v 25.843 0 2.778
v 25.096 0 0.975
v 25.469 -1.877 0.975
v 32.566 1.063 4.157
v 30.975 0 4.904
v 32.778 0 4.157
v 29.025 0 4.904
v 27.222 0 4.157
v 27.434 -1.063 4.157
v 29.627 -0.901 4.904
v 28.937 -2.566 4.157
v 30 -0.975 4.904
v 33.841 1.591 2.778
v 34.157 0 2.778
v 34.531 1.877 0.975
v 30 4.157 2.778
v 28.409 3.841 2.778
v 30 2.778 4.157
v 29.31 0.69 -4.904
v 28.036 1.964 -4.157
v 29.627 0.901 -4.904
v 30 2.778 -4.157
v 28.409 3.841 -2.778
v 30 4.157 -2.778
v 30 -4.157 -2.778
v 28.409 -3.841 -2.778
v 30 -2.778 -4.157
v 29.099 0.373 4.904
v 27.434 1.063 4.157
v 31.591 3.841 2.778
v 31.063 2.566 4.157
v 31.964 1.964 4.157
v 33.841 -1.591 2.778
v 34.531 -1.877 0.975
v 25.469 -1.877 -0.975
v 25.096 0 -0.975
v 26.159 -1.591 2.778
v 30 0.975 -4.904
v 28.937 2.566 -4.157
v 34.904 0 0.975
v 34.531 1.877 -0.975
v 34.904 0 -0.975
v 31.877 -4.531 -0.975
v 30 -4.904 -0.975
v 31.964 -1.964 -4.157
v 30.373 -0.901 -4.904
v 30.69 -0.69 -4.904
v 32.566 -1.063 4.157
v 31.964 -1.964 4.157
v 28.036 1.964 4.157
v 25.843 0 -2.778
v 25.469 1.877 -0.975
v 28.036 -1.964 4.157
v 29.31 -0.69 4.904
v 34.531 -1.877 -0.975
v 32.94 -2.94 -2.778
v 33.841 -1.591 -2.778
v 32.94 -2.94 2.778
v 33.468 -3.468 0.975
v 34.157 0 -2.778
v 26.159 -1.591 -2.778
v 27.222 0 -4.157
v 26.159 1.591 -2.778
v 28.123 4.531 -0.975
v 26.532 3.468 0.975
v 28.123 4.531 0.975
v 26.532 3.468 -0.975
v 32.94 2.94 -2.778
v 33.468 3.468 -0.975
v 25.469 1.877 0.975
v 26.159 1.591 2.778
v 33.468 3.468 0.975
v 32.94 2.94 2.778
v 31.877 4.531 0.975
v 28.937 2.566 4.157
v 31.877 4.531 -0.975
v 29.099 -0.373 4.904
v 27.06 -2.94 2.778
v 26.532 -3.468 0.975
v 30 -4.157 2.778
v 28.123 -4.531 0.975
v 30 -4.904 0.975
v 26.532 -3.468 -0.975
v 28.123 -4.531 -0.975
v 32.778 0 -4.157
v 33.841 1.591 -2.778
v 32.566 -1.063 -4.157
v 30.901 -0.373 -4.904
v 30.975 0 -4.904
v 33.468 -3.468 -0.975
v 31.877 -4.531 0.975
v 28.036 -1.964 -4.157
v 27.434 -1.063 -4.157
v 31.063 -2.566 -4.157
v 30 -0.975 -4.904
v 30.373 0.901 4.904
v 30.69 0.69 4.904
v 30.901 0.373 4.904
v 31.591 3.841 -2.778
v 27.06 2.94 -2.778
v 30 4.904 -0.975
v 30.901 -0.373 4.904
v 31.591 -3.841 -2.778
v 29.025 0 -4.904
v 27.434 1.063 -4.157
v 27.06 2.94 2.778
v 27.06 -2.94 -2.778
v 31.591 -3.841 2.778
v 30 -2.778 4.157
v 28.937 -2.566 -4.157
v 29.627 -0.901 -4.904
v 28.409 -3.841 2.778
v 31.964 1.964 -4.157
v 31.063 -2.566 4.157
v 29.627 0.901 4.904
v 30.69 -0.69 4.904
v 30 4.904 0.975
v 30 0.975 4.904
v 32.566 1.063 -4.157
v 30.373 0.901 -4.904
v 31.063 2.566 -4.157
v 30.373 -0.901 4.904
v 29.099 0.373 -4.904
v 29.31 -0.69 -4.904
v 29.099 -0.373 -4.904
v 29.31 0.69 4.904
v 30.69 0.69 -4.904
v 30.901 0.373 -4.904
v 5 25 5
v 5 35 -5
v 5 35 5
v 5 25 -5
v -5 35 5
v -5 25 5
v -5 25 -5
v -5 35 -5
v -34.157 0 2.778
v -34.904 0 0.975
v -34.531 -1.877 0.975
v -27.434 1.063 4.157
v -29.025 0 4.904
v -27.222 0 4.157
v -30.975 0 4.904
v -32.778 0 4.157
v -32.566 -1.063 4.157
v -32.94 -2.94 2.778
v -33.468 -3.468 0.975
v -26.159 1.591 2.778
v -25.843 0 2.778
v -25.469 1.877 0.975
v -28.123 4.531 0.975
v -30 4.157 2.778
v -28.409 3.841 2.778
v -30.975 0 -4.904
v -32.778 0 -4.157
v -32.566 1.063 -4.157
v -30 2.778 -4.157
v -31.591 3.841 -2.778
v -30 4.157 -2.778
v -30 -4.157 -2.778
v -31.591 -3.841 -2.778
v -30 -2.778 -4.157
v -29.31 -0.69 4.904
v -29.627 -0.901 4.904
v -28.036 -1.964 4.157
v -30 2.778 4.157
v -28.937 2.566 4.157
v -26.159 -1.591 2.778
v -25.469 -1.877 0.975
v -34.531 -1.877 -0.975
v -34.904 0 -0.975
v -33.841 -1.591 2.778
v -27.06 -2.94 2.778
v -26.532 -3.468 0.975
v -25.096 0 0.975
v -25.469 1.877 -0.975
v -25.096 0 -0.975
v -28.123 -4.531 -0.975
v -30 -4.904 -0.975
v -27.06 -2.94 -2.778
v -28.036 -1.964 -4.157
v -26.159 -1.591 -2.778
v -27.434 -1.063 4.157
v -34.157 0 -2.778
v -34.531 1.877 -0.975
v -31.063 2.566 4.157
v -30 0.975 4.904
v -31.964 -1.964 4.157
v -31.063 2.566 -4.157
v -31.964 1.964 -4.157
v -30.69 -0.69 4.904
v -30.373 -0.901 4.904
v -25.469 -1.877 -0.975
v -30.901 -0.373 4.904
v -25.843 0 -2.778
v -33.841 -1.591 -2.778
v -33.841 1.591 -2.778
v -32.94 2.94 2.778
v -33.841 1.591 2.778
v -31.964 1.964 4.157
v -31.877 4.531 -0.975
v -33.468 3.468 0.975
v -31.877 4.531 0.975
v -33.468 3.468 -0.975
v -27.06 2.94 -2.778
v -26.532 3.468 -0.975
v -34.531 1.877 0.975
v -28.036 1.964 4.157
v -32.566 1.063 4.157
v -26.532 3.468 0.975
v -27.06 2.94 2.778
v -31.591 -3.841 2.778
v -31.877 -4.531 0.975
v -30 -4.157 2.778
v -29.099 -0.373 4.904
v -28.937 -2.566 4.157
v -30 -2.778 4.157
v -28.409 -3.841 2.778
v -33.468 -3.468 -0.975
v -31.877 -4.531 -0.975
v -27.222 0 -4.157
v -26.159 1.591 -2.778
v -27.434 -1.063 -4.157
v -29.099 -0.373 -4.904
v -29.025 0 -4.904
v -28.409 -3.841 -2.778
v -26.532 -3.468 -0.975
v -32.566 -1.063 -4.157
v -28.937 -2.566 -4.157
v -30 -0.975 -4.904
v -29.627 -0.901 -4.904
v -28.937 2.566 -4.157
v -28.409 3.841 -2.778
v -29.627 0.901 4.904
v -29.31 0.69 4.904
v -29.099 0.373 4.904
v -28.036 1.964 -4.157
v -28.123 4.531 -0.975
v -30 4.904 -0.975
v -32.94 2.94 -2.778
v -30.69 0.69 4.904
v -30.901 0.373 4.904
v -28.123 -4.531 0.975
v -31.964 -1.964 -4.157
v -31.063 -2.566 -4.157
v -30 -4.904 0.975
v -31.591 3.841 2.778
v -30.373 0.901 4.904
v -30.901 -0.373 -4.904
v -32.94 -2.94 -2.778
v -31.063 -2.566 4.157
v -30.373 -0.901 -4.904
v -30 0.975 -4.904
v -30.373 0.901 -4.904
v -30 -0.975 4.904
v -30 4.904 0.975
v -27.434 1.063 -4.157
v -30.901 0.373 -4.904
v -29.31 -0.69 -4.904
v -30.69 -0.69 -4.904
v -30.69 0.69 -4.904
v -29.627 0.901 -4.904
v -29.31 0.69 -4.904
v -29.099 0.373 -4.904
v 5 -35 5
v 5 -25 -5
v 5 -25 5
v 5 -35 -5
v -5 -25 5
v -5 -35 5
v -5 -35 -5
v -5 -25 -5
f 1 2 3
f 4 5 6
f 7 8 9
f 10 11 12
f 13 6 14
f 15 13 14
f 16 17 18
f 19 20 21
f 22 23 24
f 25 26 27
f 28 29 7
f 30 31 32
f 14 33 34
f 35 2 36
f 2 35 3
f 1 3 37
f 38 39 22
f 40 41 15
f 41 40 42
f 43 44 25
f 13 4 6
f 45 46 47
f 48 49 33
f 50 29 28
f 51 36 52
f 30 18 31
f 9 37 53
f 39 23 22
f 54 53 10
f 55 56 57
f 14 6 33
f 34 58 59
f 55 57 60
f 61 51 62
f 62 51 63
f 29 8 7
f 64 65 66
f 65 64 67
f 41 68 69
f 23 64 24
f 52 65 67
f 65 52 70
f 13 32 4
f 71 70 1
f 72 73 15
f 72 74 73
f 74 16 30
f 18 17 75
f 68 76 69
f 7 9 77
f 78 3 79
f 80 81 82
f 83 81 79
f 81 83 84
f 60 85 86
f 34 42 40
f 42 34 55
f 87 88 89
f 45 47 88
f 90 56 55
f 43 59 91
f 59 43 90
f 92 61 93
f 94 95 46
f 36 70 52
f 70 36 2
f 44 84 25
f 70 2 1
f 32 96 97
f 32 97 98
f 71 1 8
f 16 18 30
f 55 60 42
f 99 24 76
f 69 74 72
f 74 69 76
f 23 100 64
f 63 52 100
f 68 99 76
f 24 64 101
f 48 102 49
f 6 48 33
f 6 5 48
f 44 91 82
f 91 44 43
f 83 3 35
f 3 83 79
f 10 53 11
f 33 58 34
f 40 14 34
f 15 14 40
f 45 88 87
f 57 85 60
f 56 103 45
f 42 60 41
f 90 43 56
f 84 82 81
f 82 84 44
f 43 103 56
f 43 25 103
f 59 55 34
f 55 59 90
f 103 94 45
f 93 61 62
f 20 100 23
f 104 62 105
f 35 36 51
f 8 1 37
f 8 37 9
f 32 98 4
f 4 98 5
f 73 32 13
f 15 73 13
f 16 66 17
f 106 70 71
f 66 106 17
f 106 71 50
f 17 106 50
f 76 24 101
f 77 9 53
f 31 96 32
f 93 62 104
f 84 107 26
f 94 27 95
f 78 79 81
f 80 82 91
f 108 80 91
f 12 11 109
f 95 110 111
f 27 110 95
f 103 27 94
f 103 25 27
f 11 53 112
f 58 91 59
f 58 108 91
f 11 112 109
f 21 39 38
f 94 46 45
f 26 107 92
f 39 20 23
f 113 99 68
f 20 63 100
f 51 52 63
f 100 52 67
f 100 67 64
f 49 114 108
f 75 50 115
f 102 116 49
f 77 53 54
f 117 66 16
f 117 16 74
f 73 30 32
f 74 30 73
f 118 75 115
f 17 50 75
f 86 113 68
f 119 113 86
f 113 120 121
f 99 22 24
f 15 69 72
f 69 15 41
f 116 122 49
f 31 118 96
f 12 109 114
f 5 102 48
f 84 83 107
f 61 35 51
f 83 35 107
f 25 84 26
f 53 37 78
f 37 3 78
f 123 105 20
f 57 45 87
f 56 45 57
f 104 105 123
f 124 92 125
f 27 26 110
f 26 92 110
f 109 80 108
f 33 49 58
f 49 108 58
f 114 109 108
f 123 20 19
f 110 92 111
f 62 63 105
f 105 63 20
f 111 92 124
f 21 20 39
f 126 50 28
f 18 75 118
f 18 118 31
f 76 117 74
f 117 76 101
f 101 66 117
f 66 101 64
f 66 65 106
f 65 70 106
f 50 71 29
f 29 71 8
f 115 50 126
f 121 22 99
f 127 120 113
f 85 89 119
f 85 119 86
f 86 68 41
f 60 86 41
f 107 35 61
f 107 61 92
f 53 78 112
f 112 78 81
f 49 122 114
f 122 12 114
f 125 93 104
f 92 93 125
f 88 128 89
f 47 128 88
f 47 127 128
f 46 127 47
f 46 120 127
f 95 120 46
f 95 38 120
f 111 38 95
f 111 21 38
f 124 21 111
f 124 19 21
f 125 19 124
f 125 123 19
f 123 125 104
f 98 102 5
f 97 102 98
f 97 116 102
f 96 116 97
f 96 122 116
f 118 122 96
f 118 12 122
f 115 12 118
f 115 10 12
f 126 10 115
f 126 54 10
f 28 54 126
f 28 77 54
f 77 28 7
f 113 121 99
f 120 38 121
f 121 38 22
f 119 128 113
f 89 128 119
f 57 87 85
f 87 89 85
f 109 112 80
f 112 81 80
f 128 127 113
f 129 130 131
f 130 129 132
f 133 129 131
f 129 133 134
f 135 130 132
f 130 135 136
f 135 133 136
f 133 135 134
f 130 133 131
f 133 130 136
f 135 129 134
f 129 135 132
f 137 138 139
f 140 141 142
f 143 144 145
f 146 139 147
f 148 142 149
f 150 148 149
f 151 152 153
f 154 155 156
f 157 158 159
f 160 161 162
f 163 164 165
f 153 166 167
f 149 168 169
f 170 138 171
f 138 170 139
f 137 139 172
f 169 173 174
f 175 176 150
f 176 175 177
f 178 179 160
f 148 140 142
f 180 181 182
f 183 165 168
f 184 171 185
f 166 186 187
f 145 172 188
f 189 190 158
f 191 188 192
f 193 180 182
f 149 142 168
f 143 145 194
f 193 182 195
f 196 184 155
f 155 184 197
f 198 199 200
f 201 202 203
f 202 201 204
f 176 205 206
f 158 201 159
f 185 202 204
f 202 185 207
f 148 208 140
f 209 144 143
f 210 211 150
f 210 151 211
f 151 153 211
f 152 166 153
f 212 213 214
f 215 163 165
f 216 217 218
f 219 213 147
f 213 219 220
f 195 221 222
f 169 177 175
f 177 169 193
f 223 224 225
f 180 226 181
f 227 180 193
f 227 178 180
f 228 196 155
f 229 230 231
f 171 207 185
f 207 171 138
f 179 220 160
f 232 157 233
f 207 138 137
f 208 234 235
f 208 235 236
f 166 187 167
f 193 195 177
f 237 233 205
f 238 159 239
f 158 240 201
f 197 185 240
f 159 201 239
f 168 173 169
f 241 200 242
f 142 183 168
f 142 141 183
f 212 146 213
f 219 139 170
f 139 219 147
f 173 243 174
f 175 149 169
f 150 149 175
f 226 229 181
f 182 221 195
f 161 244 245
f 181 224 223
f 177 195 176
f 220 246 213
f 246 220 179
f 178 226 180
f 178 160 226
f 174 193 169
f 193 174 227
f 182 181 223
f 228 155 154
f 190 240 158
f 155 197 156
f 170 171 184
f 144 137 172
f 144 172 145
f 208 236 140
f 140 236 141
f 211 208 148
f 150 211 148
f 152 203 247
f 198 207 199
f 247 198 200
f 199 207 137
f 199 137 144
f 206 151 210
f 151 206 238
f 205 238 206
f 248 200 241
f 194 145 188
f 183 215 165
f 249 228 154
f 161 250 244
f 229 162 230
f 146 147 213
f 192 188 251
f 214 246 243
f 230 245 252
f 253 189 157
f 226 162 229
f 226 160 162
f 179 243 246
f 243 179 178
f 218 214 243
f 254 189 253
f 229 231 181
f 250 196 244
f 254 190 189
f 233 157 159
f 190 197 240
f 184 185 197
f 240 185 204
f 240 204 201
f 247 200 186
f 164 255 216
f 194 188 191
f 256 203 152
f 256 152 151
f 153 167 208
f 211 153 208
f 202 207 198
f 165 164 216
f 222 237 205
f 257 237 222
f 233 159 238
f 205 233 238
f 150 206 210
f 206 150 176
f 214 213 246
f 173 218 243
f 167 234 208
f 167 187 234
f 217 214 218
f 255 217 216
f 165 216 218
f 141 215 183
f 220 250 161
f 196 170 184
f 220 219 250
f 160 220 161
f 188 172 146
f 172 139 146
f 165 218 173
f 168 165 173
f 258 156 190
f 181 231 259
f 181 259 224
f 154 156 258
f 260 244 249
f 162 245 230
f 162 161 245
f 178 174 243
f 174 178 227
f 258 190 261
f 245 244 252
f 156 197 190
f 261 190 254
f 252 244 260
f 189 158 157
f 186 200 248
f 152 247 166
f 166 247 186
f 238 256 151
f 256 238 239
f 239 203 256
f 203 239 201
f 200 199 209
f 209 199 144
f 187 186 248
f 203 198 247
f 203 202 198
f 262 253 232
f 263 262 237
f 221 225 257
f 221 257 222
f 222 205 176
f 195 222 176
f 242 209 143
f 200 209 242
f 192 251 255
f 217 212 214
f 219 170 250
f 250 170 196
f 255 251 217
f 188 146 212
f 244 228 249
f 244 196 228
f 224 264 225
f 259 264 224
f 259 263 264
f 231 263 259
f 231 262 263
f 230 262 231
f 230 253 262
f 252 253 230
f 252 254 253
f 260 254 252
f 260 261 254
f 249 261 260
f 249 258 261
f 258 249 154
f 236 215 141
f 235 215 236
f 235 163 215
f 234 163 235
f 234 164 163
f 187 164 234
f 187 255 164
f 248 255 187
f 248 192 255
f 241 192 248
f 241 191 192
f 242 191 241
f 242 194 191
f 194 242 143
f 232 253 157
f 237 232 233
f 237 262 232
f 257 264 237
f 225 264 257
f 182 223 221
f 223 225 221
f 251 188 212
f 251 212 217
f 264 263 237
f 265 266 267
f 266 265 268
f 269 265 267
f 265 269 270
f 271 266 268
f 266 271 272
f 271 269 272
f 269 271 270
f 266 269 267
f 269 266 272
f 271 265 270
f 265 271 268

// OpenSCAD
// An interpreter module that can be extended
// to understand more SShapes (arrays representing shapes)
// by delegating to children(), passing the
// mystery SShape using the dynamic variable, $mod.

module mcext0_domodule(mod) {
	assert(is_list(mod));
	assert(len(mod) > 0);
	if( mod[0] == "polygon-vp" ) {
		// ["polygon-vp", vertexes, paths]
		polygon(points=mod[1], paths=mod[2]);
	} else if( mod[0] == "polyhedron-vf" ) {
		polyhedron(mod[1], faces=mod[2]);
	} else if( mod[0] == "scale" ) {
		assert(len(mod) == 3);
		scale(mod[1]) mcext0_domodule(mod[2]) children();
	} else if( mod[0] == "translate" ) {
		assert(len(mod) == 3);
		assert(is_list(mod[1]));
		for(c=mod[1]) assert(is_num(c), "translate component should be numeric");
		translate(mod[1]) mcext0_domodule(mod[2]) children();
	} else if( mod[0] == "rotate" ) {
		assert(len(mod) == 3);
		rotate(mod[1]) mcext0_domodule(mod[2]) children();
	} else if( mod[0] == "intersection" ) {
		intersection_for( i=[1:1:len(mod)-1] ) mcext0_domodule(mod[i]) children();
	} else if( mod[0] == "difference" ) {
		difference() {
			mcext0_domodule(mod[1]) children();
			for( i=[2:1:len(mod)-1] ) mcext0_domodule(mod[i]) children();
		}
	} else if( mod[0] == "union" ) {
		for( i=[1:1:len(mod)-1] ) mcext0_domodule(mod[i]) children();
	} else if( mod[0] == "hull" ) {
		hull() for( i=[1:1:len(mod)-1] ) mcext0_domodule(mod[i]) children();
	} else if( mod[0] == "linear-extrude-zs" ) {
		// ["linear-extrude-zs", [z0,z1], 2d_shape] // centered
		// ["linear-extrude-zs", height, 2d_shape]
		let( zrange = is_list(mod[1]) ? mod[1] : [-mod[1]/2, mod[1]/2] ) {
			translate([0,0,zrange[0]]) linear_extrude(zrange[1]-zrange[0]) mcext0_domodule(mod[2]) children();
		}
	} else if( mod[0] == "render" ) {
		render() mcext0_domodule(mod[1]);
	} else if( mod[0] == "x-debug" ) {
		# mcext0_domodule(mod[1]) children();
	} else if( $children > 0 ) {
		$mod = mod;
		children();
	} else {
		assert(false, str("mcext0_domodule: Unrecognized shape: ", mod[0]));
	}
}

module mcmuffin() {
	sphere(d=10);
}
module mcriddle() {
	cube([10,10,10], center=true);
}

module mcext1_domodule(mod) {
	echo(mcext1_domodule_mod=mod);
	if( mod[0] == "mcmuffin" ) {
		mcmuffin();
	} else if( $children > 0 ) {
		$mod = mod;
		children();
	} else {
		assert(false, str("mcext1_domodule: Unrecognized shape: ", mod[0]));
	}
}

module mcext2_domodule(mod) {
	echo(mcext2_domodule_mod=mod);
	if( mod[0] == "mcriddle" ) {
		mcriddle();
	} else if( $children > 0 ) {
		$mod = mod;
		children();
	} else {
		assert(false, str("mcext2_domodule: Unrecognized shape: ", mod[0]));
	}
}

// Demonstration: mcext0_domodule (which is based on TOGMod1)
// knows about 'union' and 'translate', but not 'mcmuffin'
// or 'mcriddle'; child modules, however, can handle those.
mcext0_domodule(["union",
	["translate", [30,0,0], ["mcmuffin"]],
	["translate", [0,30,0], ["mcriddle"]],
]) mcext1_domodule($mod) mcext2_domodule($mod);

// Order of children doesn't matter, so
// long as they all follow this pattern and don't
// overlap in functionality, and so long as
// arguments to 'operators' are handled no farther up
// the chain than the operators themselves, which can
// be worked around by repetition:
mcext2_domodule(["union",
	["translate", [-30,0,0], ["mcmuffin"]],
	["translate", [0,-30,0], ["mcriddle"]],
]) mcext1_domodule($mod) mcext0_domodule($mod) mcext2_domodule($mod) mcext1_domodule($mod);
